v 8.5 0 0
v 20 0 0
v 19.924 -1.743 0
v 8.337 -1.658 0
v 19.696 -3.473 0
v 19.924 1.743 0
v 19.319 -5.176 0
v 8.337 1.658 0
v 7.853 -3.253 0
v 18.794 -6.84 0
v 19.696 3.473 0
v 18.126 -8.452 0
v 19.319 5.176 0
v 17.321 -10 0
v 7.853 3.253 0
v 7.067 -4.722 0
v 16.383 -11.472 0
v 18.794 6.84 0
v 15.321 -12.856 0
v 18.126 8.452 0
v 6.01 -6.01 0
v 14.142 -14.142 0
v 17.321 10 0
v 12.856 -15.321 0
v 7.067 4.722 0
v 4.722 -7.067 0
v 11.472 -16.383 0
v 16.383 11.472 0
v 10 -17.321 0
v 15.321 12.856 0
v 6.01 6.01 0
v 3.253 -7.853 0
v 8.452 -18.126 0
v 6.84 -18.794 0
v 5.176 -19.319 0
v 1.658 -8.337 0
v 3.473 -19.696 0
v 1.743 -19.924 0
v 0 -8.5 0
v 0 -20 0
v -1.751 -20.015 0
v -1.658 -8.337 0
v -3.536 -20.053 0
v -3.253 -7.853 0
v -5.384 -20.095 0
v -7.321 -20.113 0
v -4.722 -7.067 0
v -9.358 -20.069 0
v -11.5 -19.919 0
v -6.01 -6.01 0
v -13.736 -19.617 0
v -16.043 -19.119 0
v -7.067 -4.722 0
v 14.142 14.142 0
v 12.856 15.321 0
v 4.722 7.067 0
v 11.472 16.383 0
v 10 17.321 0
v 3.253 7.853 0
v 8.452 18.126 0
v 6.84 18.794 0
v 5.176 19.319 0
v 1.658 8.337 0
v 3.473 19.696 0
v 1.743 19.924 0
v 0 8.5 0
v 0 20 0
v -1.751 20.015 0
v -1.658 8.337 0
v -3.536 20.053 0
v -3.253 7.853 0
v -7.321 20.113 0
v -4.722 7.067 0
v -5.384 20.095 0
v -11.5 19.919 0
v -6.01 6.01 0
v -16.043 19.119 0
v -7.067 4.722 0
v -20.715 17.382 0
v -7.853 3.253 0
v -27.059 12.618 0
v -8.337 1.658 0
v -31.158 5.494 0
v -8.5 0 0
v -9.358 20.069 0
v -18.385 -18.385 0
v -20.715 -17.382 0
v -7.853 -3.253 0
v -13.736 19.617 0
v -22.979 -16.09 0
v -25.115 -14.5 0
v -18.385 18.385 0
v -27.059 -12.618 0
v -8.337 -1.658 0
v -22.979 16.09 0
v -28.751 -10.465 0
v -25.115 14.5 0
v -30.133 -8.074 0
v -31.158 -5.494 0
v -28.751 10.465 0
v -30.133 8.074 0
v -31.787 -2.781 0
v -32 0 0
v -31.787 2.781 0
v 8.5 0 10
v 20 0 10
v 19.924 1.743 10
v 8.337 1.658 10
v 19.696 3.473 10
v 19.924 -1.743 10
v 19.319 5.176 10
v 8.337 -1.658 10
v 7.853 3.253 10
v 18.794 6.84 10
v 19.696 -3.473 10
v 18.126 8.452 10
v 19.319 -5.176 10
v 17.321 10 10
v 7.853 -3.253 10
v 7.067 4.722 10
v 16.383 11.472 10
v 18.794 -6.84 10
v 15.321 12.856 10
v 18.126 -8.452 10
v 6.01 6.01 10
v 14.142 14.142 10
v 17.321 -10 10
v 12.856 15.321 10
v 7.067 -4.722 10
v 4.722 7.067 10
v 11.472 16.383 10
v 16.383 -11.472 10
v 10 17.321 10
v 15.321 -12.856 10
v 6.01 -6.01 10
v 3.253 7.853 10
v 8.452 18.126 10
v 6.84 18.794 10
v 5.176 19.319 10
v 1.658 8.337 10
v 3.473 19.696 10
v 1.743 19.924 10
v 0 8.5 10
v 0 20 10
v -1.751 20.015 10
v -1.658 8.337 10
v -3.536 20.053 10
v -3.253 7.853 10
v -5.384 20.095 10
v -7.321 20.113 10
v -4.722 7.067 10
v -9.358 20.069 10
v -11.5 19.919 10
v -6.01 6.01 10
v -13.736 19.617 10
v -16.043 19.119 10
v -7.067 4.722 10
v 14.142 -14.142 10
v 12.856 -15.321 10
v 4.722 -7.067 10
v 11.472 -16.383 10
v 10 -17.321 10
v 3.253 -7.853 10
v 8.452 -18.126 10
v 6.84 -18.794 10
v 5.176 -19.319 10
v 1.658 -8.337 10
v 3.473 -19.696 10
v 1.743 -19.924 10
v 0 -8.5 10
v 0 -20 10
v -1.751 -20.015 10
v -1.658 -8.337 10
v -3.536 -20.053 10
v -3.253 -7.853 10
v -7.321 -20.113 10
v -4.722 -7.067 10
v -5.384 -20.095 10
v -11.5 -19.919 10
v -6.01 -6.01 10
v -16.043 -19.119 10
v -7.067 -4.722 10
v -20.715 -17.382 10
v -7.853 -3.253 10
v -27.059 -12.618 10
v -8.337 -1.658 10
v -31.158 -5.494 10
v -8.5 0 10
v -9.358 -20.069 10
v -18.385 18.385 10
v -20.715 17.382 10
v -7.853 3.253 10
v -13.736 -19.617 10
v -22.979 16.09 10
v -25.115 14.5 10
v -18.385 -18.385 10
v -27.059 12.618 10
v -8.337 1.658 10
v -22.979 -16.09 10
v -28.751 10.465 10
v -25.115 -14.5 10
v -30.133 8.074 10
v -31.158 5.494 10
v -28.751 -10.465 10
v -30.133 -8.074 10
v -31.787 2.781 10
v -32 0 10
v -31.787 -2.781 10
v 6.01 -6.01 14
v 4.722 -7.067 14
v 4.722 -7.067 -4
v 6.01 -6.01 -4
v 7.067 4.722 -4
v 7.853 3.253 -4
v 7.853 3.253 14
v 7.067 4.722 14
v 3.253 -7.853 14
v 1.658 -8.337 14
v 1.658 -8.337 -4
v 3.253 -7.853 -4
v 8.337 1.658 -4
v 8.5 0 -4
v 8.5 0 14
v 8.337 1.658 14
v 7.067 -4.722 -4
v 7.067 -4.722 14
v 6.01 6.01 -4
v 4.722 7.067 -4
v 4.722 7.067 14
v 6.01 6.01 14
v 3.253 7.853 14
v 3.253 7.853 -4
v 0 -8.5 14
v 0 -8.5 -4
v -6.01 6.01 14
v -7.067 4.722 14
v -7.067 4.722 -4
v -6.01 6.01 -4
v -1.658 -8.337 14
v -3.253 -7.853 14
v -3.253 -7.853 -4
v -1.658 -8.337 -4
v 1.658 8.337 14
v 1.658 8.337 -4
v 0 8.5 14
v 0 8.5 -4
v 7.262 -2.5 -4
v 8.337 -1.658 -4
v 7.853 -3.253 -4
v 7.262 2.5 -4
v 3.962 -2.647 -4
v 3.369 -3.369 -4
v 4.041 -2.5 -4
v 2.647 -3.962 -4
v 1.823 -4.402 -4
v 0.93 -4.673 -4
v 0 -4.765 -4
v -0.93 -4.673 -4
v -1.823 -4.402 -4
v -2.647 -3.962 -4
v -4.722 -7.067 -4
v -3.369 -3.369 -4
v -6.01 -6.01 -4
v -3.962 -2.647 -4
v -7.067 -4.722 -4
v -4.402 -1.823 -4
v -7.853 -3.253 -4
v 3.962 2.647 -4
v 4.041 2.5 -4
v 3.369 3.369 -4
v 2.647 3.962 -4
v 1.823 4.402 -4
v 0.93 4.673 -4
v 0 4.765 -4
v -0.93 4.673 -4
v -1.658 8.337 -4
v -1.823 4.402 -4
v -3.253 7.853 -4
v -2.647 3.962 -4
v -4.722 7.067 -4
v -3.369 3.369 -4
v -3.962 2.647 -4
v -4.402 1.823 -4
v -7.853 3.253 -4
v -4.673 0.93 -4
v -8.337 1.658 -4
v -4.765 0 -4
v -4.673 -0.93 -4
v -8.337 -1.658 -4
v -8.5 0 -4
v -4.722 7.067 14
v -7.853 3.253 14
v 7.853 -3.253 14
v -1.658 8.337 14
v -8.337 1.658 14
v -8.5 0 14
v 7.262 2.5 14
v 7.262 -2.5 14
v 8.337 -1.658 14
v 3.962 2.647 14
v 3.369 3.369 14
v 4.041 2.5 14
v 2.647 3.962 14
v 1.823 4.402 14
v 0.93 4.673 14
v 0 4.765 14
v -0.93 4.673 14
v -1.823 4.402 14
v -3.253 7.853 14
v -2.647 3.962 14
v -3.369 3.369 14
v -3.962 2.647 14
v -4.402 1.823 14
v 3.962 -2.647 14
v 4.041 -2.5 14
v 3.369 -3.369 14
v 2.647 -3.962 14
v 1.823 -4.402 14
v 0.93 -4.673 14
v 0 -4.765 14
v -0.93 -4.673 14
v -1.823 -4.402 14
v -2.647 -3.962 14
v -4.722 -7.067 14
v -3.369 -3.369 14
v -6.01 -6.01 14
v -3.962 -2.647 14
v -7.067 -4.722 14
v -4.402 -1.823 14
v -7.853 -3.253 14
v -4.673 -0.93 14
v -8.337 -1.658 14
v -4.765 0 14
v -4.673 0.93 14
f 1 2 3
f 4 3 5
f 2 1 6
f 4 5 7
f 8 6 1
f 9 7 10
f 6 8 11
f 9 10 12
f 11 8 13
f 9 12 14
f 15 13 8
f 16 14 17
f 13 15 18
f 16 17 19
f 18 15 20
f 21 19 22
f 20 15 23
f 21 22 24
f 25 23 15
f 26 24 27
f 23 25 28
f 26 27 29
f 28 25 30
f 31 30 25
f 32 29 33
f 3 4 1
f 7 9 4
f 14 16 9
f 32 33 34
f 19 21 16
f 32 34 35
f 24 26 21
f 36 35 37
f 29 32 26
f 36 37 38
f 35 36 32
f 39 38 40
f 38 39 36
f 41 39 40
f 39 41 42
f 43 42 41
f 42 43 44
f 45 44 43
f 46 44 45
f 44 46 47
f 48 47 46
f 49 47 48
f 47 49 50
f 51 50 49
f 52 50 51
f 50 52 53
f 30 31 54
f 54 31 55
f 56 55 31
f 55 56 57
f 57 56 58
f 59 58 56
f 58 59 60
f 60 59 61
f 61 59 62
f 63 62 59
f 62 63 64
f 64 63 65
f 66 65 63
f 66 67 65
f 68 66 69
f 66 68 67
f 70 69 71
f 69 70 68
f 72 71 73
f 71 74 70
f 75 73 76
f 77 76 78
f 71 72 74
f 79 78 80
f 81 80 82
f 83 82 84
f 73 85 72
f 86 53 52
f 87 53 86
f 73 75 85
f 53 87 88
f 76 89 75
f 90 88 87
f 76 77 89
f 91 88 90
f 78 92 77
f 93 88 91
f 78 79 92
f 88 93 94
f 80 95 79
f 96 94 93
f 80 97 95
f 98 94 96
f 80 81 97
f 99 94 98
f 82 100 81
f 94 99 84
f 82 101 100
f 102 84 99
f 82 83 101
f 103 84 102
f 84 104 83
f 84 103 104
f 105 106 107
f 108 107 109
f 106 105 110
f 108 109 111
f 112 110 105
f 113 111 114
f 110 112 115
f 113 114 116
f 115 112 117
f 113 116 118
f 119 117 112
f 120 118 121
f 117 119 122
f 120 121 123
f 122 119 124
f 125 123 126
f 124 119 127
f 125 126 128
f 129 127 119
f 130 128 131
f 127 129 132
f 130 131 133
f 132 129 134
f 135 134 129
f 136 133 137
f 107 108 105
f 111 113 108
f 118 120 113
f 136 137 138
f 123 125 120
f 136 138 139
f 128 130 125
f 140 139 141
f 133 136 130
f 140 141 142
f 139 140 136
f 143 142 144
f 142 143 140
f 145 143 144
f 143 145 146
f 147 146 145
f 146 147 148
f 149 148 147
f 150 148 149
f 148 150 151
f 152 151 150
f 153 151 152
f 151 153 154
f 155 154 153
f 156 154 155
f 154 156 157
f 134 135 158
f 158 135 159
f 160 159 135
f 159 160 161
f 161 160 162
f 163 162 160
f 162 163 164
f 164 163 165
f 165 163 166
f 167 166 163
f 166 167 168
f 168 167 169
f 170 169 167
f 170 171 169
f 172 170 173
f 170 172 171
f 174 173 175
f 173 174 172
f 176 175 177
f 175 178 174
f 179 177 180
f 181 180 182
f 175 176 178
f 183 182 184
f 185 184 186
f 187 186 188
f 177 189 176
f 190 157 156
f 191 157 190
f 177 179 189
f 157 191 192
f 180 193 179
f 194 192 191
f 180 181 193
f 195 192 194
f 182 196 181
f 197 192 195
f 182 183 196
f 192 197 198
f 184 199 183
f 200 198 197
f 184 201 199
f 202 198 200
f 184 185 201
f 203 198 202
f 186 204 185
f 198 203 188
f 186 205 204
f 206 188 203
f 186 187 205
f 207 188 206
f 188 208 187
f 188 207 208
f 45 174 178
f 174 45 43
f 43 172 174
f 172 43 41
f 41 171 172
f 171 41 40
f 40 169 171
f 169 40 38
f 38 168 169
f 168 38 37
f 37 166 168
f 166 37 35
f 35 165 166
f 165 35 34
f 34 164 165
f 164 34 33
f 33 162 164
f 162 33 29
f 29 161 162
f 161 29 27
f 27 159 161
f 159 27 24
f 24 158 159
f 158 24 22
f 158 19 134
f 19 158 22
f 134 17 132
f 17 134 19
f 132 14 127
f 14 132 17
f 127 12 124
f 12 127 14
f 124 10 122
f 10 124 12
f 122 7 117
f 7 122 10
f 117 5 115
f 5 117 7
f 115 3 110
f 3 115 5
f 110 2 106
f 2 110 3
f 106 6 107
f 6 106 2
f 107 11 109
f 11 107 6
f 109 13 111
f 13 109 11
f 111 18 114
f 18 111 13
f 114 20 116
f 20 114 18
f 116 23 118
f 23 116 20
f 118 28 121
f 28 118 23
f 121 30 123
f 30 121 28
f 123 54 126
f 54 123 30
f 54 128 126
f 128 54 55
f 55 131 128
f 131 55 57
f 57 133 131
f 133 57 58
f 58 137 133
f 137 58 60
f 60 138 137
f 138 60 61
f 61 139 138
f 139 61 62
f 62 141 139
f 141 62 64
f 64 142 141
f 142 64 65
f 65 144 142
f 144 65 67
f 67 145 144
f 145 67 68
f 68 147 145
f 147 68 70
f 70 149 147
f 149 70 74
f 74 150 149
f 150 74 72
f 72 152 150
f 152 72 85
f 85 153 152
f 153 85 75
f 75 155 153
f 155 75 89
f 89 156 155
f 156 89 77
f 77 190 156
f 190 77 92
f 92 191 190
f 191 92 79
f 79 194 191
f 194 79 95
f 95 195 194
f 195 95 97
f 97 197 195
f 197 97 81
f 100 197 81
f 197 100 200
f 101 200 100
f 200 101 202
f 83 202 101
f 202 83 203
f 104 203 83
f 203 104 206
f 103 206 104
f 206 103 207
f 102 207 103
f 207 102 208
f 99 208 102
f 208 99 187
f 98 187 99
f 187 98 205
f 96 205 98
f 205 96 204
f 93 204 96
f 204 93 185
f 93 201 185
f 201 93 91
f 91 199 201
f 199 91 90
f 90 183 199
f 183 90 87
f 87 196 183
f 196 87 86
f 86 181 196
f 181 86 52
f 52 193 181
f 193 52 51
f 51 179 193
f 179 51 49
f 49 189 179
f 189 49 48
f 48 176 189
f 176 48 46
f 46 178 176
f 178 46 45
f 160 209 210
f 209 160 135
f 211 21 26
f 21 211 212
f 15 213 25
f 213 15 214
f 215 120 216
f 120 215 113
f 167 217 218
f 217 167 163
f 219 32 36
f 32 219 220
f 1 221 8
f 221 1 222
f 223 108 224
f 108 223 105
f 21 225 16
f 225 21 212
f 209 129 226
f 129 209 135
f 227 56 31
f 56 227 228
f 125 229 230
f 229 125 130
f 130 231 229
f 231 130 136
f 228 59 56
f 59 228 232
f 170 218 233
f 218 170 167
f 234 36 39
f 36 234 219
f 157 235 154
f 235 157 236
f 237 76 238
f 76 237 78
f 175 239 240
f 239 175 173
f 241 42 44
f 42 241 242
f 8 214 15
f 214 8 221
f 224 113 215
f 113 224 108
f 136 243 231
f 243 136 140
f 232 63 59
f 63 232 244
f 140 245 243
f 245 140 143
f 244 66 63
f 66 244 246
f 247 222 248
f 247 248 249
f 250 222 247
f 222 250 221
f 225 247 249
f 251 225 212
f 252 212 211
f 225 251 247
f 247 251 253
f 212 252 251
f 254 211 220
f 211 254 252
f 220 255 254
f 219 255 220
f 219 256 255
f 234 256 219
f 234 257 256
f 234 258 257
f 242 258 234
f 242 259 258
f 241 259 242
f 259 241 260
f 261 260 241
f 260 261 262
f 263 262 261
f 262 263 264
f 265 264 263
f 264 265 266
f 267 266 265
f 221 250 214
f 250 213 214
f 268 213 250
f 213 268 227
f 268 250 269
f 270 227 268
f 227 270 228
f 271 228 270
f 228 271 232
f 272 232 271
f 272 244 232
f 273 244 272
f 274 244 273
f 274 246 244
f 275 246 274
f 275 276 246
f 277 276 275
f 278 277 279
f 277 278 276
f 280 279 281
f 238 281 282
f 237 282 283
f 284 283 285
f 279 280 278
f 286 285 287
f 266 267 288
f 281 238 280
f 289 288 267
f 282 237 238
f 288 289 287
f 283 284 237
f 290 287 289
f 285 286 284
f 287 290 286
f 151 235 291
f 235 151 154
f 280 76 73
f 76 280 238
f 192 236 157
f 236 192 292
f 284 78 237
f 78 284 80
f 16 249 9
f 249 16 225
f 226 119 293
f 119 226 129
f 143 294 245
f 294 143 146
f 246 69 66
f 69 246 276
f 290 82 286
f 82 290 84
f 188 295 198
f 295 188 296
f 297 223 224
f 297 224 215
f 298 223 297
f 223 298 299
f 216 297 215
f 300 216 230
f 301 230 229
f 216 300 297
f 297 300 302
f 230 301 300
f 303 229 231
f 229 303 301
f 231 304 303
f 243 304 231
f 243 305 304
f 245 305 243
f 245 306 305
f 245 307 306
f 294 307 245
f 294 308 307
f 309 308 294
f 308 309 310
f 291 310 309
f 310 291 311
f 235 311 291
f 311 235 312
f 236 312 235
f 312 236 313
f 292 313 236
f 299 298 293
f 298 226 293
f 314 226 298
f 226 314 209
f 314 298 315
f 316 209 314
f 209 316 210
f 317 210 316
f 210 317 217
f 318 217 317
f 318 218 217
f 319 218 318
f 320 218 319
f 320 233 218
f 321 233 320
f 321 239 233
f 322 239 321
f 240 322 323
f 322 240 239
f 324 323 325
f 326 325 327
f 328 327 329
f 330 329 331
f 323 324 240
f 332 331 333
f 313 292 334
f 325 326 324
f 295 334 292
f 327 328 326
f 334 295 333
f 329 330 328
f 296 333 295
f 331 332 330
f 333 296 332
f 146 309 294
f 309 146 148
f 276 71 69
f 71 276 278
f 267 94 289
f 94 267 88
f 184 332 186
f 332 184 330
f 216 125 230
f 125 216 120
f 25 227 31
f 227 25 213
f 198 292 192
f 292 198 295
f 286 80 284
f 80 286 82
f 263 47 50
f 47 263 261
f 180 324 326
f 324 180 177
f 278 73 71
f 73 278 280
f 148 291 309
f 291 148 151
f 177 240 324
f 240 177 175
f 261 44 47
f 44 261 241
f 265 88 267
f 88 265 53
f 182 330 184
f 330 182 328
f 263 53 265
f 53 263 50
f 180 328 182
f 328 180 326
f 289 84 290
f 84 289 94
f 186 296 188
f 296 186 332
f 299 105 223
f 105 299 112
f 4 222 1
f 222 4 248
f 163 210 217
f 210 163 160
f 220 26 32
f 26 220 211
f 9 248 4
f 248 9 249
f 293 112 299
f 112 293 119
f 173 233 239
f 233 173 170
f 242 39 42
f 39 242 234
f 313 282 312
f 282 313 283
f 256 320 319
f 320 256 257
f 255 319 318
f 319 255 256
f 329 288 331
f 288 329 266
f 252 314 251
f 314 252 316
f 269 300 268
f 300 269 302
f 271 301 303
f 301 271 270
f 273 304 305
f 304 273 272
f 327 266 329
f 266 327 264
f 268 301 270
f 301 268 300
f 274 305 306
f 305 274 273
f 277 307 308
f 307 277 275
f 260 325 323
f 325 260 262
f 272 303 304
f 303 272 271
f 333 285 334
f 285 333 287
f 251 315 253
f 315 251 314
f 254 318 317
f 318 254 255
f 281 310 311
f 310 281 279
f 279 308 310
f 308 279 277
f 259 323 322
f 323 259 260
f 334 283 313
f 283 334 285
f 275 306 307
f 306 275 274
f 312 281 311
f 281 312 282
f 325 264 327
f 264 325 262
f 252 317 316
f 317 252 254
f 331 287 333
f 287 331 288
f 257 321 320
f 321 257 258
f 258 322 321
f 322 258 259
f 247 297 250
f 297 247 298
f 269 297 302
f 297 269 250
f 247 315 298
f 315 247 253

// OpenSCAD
$fn = 32;

// ----------------------------------------------------------------------
// Cam: base radius 20 mm with a 12 mm lift over 180 degrees
// ----------------------------------------------------------------------

// --- parameters (mm) ---
base_r = 20;              // base radius
lift = 12;                // lift height above the base radius
lift_span = 180;          // angular width of the lift
lift_start = 90;          // angle where the lift starts
cam_t = 10;               // cam plate thickness
hub_d = 17;               // hub diameter
hub_h = 18;               // hub height
bore_d = 9.53;            // bore
key_w = 5;                // keyway width
key_depth = 1.74;         // keyway depth

cam_profile = [[20, 0], [19.924, 1.743], [19.696, 3.473], [19.319, 5.176], [18.794, 6.84], [18.126, 8.452], [17.321, 10], [16.383, 11.472], [15.321, 12.856], [14.142, 14.142], [12.856, 15.321], [11.472, 16.383], [10, 17.321], [8.452, 18.126], [6.84, 18.794], [5.176, 19.319], [3.473, 19.696], [1.743, 19.924], [0, 20], [-1.751, 20.015], [-3.536, 20.053], [-5.384, 20.095], [-7.321, 20.113], [-9.358, 20.069], [-11.5, 19.919], [-13.736, 19.617], [-16.043, 19.119], [-18.385, 18.385], [-20.715, 17.382], [-22.979, 16.09], [-25.115, 14.5], [-27.059, 12.618], [-28.751, 10.465], [-30.133, 8.074], [-31.158, 5.494], [-31.787, 2.781], [-32, 0], [-31.787, -2.781], [-31.158, -5.494], [-30.133, -8.074], [-28.751, -10.465], [-27.059, -12.618], [-25.115, -14.5], [-22.979, -16.09], [-20.715, -17.382], [-18.385, -18.385], [-16.043, -19.119], [-13.736, -19.617], [-11.5, -19.919], [-9.358, -20.069], [-7.321, -20.113], [-5.384, -20.095], [-3.536, -20.053], [-1.751, -20.015], [0, -20], [1.743, -19.924], [3.473, -19.696], [5.176, -19.319], [6.84, -18.794], [8.452, -18.126], [10, -17.321], [11.472, -16.383], [12.856, -15.321], [14.142, -14.142], [15.321, -12.856], [16.383, -11.472], [17.321, -10], [18.126, -8.452], [18.794, -6.84], [19.319, -5.176], [19.696, -3.473], [19.924, -1.743]];

difference() {
  union() {
    linear_extrude(height = cam_t) polygon(cam_profile);
    /* hub, proud of the cam plate on both sides */
    translate([0, 0, -4]) cylinder(h = hub_h, d = hub_d);
  }
  /* bore through the hub, 2.5 mm clear on both faces */
  translate([0, 0, -6.5]) cylinder(h = hub_h + 5, d = bore_d);
  /* keyway, milled through the whole hub */
  translate([3.022, -2.5, -6.5]) cube([4.24, 5, 23]);
}
